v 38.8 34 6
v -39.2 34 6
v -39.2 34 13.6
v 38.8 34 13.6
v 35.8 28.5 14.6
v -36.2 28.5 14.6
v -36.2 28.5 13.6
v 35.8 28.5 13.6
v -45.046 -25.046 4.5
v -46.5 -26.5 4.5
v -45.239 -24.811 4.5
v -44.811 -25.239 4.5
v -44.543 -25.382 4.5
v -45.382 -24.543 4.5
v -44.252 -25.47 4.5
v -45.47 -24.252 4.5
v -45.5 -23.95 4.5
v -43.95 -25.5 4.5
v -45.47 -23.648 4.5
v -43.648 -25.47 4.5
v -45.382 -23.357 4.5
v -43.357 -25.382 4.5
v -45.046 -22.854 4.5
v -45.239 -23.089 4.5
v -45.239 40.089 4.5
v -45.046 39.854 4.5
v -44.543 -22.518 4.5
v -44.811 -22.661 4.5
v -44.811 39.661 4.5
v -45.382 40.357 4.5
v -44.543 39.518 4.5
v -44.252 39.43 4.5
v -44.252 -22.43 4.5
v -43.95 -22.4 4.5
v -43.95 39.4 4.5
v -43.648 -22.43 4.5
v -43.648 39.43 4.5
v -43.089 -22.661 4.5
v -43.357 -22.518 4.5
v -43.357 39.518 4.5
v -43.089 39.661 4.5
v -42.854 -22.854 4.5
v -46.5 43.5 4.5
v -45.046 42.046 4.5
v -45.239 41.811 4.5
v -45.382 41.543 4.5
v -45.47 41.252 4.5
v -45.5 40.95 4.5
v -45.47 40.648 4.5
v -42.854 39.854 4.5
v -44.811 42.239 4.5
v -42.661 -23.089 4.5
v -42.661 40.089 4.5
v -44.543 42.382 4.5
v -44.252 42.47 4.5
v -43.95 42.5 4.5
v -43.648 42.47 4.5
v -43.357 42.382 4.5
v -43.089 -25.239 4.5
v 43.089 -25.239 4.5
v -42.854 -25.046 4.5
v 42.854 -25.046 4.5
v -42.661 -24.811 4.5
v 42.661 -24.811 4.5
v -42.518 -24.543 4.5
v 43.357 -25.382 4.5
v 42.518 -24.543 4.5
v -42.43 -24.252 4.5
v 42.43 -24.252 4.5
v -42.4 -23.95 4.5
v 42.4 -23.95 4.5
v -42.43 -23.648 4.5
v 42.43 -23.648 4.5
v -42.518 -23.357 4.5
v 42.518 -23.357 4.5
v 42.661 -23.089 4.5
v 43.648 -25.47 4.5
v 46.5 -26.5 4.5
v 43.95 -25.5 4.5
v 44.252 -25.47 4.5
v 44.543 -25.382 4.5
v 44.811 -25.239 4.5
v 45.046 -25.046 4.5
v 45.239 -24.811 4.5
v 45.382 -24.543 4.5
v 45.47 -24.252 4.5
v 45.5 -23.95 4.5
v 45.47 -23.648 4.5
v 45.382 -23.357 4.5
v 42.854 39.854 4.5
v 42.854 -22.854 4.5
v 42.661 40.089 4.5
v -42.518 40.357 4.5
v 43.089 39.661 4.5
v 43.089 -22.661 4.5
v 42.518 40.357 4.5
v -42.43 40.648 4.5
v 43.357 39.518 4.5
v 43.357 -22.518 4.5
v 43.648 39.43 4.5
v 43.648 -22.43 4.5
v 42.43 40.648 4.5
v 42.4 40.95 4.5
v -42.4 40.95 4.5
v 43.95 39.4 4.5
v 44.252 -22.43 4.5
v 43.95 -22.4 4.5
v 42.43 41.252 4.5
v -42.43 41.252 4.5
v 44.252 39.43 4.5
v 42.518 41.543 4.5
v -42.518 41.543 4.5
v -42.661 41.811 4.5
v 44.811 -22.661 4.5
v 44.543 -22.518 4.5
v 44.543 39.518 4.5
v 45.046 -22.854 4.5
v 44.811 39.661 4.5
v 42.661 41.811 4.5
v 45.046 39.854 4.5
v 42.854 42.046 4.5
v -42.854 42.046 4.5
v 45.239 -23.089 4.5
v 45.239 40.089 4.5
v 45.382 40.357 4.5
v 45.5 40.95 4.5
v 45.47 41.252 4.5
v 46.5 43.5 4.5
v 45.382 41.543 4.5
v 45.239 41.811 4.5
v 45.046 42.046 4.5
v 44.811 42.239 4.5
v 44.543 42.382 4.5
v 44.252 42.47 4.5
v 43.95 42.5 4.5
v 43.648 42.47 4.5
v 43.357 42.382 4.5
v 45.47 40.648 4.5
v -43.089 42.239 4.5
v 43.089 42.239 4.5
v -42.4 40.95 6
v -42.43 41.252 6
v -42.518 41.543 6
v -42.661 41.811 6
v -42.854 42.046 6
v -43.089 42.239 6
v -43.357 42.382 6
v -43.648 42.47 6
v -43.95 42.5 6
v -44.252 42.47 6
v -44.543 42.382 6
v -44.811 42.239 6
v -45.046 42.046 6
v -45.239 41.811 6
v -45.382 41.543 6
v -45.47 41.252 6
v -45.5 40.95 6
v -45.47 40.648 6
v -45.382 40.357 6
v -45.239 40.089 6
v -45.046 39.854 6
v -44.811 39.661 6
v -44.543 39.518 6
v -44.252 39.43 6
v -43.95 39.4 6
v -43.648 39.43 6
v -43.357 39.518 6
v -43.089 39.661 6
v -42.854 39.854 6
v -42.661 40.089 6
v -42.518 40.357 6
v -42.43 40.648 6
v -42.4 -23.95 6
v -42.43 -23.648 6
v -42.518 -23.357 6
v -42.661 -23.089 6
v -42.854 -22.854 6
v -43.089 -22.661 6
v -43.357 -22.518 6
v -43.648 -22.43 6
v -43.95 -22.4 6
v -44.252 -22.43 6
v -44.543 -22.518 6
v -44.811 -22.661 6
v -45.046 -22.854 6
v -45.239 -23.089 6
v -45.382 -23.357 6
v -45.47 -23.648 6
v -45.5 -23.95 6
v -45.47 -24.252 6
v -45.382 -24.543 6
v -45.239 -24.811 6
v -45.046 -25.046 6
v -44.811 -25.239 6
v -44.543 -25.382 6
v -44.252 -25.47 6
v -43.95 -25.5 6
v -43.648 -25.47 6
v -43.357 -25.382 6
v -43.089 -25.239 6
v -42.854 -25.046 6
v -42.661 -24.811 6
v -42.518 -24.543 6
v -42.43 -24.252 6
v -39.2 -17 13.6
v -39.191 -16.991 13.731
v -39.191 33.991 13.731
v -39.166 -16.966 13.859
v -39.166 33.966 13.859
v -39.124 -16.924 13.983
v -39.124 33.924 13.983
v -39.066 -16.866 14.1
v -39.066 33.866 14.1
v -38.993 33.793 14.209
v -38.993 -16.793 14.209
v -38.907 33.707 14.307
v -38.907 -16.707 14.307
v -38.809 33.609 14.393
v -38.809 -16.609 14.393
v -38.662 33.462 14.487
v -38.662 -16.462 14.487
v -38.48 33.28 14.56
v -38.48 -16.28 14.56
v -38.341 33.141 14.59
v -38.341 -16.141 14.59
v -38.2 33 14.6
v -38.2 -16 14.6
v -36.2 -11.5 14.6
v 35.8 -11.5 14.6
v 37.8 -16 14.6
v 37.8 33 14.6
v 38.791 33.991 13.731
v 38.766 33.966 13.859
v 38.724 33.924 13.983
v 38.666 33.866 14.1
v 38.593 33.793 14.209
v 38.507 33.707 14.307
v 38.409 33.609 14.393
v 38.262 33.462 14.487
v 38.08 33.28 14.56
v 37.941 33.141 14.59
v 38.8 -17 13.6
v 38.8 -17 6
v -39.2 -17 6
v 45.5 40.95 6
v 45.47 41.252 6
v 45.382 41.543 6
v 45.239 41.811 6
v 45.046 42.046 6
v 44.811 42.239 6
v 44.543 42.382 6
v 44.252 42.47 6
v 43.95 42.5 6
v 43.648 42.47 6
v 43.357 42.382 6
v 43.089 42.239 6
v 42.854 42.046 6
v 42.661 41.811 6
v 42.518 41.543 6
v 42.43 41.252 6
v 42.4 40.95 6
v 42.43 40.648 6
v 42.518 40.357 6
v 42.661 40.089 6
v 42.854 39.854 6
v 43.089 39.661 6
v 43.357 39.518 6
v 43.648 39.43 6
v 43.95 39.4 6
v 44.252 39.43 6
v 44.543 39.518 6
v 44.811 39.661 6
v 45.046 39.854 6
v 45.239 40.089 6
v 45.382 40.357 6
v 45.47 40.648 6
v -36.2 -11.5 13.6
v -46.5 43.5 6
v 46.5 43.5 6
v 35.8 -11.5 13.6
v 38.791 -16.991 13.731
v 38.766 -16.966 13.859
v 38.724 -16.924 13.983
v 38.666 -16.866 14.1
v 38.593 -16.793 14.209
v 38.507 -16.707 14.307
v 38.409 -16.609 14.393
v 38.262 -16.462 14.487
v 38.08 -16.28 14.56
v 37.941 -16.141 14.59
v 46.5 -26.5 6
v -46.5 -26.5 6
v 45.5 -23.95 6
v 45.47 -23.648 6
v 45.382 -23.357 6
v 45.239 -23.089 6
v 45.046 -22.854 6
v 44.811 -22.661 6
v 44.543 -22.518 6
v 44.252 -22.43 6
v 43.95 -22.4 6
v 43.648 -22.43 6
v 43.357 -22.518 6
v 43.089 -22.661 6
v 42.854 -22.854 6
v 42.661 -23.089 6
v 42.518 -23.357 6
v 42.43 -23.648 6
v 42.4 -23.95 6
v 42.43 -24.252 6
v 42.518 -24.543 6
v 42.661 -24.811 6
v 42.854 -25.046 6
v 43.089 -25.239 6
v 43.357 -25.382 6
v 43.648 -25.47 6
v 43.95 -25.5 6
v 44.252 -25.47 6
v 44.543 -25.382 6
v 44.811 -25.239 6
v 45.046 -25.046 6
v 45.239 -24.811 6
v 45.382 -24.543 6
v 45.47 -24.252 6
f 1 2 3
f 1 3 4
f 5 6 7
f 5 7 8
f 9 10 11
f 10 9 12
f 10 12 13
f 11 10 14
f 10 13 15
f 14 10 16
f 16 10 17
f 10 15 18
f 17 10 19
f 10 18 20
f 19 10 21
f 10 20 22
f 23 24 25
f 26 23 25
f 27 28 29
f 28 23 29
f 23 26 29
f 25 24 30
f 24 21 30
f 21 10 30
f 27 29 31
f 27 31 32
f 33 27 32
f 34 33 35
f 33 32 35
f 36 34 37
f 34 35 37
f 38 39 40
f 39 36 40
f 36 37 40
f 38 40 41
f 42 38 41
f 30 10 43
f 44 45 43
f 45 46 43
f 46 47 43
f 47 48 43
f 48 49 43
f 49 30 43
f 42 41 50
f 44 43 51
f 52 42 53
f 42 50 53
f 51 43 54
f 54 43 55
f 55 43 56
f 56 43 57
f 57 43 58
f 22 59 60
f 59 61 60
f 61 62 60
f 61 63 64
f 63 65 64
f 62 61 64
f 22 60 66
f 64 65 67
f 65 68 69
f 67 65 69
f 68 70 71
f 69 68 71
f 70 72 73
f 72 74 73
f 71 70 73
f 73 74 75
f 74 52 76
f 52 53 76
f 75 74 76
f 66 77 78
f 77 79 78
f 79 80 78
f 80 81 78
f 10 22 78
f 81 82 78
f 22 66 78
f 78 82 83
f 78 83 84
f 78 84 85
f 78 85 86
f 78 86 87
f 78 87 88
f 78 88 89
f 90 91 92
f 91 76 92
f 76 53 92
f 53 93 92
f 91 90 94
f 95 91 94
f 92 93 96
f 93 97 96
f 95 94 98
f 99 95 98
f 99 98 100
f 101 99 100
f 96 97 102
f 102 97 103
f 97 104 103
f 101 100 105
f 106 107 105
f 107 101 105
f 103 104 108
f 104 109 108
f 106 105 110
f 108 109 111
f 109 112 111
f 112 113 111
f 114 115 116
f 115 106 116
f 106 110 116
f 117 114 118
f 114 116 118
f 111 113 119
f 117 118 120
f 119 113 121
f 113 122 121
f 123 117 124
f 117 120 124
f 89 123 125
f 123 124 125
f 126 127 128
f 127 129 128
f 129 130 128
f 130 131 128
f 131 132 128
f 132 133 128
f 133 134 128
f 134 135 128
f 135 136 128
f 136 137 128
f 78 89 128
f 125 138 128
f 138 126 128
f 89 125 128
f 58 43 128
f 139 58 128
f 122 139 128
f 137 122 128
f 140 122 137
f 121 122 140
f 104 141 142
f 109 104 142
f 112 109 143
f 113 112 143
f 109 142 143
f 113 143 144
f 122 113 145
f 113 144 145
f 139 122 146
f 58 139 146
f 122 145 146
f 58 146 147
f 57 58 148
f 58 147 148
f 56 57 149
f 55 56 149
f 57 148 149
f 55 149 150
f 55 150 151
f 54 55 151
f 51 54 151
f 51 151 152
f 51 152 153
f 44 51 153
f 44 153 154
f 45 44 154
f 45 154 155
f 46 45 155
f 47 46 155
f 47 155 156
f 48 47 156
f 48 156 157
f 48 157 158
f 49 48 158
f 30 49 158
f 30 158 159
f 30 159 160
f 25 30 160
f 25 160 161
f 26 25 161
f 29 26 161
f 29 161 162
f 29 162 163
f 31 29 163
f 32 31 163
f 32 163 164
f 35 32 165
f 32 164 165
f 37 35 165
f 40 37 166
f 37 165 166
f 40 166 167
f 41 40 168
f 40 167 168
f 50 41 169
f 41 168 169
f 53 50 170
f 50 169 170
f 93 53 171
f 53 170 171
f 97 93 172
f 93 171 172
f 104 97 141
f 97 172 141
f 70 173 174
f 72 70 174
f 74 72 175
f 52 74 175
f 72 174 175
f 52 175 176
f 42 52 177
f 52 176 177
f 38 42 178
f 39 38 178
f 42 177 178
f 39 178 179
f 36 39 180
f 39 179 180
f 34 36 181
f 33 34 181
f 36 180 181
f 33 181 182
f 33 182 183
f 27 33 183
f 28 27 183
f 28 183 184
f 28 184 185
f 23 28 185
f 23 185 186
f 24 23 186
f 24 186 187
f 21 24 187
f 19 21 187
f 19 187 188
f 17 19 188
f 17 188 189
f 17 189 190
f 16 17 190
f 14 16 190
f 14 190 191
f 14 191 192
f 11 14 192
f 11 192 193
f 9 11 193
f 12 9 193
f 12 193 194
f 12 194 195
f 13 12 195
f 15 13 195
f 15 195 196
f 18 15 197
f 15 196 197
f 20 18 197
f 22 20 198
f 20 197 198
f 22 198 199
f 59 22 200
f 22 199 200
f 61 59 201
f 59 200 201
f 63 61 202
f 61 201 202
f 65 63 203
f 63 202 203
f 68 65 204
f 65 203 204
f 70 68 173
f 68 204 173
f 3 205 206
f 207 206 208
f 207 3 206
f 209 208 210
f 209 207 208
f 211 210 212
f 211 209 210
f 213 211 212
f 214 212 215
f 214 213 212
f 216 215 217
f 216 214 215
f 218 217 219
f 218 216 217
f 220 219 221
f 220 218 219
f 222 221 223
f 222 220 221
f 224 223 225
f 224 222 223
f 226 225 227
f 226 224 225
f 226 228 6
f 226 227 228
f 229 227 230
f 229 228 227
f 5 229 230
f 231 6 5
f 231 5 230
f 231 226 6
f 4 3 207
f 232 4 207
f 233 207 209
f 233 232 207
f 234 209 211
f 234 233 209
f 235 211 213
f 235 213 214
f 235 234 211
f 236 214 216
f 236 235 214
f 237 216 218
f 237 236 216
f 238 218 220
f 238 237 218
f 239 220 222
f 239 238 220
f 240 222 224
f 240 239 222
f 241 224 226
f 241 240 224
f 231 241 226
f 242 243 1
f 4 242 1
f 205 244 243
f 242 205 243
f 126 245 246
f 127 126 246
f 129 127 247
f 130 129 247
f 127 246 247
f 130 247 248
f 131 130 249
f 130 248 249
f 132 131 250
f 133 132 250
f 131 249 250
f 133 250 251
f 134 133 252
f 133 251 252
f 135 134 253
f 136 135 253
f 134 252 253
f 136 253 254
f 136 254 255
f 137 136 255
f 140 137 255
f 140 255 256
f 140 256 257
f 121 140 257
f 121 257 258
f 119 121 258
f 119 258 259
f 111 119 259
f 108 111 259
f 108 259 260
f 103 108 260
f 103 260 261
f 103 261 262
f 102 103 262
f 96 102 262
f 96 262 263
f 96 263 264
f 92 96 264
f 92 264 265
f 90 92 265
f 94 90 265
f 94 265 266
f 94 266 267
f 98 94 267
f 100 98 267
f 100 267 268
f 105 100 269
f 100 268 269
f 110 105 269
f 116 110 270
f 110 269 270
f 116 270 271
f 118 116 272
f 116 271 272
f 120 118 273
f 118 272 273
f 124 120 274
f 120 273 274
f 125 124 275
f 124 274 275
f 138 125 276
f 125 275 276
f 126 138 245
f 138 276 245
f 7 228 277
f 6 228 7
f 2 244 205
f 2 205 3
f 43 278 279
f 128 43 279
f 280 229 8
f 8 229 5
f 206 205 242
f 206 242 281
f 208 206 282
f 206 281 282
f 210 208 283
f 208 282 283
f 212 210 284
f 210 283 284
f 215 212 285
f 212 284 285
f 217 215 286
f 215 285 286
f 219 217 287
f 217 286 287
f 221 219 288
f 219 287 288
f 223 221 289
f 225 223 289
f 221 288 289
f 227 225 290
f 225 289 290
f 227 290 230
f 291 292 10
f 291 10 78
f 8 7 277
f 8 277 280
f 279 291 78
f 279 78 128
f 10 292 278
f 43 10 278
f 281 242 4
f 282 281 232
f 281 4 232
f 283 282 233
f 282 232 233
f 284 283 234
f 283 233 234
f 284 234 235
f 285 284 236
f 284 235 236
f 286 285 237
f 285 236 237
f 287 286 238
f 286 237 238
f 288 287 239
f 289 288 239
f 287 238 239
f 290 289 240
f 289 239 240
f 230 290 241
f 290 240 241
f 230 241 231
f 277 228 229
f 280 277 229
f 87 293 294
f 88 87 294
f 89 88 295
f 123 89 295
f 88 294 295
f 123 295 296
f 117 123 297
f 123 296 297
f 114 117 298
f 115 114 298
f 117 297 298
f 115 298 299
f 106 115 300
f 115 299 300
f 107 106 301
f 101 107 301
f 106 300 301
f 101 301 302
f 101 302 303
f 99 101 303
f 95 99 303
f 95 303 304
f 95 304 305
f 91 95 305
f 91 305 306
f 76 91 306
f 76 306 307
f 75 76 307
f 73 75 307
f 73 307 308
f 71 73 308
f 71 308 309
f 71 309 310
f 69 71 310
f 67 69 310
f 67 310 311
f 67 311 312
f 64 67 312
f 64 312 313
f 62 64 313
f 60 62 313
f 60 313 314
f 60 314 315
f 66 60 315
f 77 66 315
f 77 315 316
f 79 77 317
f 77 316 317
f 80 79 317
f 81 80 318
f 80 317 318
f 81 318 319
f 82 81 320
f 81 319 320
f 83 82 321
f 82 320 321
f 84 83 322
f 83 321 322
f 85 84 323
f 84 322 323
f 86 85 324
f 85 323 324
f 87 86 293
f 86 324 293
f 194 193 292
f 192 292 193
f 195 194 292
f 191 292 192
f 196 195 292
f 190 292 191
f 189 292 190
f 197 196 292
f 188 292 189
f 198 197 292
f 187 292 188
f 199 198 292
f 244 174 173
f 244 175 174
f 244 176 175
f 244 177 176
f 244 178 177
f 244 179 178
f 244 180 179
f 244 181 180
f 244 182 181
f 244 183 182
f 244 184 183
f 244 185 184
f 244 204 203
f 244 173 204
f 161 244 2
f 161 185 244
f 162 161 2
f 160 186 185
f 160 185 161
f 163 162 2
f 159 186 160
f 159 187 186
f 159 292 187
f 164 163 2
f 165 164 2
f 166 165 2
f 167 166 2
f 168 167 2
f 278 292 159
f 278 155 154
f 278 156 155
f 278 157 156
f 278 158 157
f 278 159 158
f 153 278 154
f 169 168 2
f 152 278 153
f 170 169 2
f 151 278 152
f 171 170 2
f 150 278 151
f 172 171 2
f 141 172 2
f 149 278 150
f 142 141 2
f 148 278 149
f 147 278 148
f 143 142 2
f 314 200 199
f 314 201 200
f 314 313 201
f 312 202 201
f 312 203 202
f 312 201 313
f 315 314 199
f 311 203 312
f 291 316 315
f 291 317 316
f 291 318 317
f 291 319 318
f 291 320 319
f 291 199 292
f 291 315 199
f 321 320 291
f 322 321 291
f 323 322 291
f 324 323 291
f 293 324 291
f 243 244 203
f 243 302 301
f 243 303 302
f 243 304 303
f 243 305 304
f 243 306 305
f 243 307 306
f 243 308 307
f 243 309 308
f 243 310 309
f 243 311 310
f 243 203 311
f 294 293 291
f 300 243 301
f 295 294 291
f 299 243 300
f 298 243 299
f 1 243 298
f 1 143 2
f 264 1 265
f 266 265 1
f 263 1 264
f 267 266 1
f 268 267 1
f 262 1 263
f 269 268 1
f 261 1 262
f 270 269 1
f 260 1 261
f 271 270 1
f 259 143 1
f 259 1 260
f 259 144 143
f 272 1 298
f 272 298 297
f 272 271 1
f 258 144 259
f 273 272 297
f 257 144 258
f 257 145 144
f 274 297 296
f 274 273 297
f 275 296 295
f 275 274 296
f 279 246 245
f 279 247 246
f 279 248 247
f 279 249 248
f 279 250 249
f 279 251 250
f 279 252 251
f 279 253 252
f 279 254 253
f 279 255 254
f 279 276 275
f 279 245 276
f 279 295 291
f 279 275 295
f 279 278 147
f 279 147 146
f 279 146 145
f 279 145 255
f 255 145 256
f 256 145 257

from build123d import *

# Parameters (mm, degrees)
CROQUIS1_W                          = 93
CROQUIS1_H                          = 70
SALIENTE_EXTRUIR1_DEPTH             = 1.5
CROQUIS2_W                          = 78
CROQUIS2_H                          = 51
SALIENTE_EXTRUIR2_DEPTH             = 8.6
DI_METRO_DE_TALADRO_3_1_3_1_1_D     = 3.1
DI_METRO_DE_TALADRO_3_1_3_1_1_DEPTH = 10.1
REDONDEO1_R                         = 1
CROQUIS5_W                          = 72
CROQUIS5_H                          = 40
CORTAR_EXTRUIR1_DEPTH               = 1


with BuildPart() as part:
    # Croquis1 → Saliente-Extruir1 (new body)
    with BuildSketch(Plane.XY.offset(6)):
        with Locations((0, 8.5)):
            Rectangle(CROQUIS1_W, CROQUIS1_H)
    extrude(amount=-SALIENTE_EXTRUIR1_DEPTH)

    # Croquis2 → Saliente-Extruir2 (add)
    with BuildSketch(Plane.XY.offset(6)):
        with Locations((-0.2, 8.5)):
            Rectangle(CROQUIS2_W, CROQUIS2_H)
    extrude(amount=SALIENTE_EXTRUIR2_DEPTH)

    # Diámetro de taladro Ø3.1 (3.1)1
    with Locations(Plane(origin=(0, 0, 4.5), x_dir=(-1, 0, 0), z_dir=(0, 0, -1))):
        with Locations((43.95, -23.95), (-43.95, -23.95), (43.95, 40.95), (-43.95, 40.95)):
            Hole(DI_METRO_DE_TALADRO_3_1_3_1_1_D / 2, depth=DI_METRO_DE_TALADRO_3_1_3_1_1_DEPTH)

    # Redondeo1
    redondeo1_edges = [part.edges().sort_by_distance(p)[0] for p in [
        (-0.2, -17, 14.6),
        (38.8, 8.5, 14.6),
        (-0.2, 34, 14.6),
        (-39.2, 8.5, 14.6),
    ]]
    fillet(redondeo1_edges, radius=REDONDEO1_R)

    # Croquis5 → Cortar-Extruir1 (cut)
    with BuildSketch(Plane.XY.offset(14.6)):
        with Locations((-0.2, 8.5)):
            Rectangle(CROQUIS5_W, CROQUIS5_H)
    extrude(amount=-CORTAR_EXTRUIR1_DEPTH, mode=Mode.SUBTRACT)


solid = part.part
